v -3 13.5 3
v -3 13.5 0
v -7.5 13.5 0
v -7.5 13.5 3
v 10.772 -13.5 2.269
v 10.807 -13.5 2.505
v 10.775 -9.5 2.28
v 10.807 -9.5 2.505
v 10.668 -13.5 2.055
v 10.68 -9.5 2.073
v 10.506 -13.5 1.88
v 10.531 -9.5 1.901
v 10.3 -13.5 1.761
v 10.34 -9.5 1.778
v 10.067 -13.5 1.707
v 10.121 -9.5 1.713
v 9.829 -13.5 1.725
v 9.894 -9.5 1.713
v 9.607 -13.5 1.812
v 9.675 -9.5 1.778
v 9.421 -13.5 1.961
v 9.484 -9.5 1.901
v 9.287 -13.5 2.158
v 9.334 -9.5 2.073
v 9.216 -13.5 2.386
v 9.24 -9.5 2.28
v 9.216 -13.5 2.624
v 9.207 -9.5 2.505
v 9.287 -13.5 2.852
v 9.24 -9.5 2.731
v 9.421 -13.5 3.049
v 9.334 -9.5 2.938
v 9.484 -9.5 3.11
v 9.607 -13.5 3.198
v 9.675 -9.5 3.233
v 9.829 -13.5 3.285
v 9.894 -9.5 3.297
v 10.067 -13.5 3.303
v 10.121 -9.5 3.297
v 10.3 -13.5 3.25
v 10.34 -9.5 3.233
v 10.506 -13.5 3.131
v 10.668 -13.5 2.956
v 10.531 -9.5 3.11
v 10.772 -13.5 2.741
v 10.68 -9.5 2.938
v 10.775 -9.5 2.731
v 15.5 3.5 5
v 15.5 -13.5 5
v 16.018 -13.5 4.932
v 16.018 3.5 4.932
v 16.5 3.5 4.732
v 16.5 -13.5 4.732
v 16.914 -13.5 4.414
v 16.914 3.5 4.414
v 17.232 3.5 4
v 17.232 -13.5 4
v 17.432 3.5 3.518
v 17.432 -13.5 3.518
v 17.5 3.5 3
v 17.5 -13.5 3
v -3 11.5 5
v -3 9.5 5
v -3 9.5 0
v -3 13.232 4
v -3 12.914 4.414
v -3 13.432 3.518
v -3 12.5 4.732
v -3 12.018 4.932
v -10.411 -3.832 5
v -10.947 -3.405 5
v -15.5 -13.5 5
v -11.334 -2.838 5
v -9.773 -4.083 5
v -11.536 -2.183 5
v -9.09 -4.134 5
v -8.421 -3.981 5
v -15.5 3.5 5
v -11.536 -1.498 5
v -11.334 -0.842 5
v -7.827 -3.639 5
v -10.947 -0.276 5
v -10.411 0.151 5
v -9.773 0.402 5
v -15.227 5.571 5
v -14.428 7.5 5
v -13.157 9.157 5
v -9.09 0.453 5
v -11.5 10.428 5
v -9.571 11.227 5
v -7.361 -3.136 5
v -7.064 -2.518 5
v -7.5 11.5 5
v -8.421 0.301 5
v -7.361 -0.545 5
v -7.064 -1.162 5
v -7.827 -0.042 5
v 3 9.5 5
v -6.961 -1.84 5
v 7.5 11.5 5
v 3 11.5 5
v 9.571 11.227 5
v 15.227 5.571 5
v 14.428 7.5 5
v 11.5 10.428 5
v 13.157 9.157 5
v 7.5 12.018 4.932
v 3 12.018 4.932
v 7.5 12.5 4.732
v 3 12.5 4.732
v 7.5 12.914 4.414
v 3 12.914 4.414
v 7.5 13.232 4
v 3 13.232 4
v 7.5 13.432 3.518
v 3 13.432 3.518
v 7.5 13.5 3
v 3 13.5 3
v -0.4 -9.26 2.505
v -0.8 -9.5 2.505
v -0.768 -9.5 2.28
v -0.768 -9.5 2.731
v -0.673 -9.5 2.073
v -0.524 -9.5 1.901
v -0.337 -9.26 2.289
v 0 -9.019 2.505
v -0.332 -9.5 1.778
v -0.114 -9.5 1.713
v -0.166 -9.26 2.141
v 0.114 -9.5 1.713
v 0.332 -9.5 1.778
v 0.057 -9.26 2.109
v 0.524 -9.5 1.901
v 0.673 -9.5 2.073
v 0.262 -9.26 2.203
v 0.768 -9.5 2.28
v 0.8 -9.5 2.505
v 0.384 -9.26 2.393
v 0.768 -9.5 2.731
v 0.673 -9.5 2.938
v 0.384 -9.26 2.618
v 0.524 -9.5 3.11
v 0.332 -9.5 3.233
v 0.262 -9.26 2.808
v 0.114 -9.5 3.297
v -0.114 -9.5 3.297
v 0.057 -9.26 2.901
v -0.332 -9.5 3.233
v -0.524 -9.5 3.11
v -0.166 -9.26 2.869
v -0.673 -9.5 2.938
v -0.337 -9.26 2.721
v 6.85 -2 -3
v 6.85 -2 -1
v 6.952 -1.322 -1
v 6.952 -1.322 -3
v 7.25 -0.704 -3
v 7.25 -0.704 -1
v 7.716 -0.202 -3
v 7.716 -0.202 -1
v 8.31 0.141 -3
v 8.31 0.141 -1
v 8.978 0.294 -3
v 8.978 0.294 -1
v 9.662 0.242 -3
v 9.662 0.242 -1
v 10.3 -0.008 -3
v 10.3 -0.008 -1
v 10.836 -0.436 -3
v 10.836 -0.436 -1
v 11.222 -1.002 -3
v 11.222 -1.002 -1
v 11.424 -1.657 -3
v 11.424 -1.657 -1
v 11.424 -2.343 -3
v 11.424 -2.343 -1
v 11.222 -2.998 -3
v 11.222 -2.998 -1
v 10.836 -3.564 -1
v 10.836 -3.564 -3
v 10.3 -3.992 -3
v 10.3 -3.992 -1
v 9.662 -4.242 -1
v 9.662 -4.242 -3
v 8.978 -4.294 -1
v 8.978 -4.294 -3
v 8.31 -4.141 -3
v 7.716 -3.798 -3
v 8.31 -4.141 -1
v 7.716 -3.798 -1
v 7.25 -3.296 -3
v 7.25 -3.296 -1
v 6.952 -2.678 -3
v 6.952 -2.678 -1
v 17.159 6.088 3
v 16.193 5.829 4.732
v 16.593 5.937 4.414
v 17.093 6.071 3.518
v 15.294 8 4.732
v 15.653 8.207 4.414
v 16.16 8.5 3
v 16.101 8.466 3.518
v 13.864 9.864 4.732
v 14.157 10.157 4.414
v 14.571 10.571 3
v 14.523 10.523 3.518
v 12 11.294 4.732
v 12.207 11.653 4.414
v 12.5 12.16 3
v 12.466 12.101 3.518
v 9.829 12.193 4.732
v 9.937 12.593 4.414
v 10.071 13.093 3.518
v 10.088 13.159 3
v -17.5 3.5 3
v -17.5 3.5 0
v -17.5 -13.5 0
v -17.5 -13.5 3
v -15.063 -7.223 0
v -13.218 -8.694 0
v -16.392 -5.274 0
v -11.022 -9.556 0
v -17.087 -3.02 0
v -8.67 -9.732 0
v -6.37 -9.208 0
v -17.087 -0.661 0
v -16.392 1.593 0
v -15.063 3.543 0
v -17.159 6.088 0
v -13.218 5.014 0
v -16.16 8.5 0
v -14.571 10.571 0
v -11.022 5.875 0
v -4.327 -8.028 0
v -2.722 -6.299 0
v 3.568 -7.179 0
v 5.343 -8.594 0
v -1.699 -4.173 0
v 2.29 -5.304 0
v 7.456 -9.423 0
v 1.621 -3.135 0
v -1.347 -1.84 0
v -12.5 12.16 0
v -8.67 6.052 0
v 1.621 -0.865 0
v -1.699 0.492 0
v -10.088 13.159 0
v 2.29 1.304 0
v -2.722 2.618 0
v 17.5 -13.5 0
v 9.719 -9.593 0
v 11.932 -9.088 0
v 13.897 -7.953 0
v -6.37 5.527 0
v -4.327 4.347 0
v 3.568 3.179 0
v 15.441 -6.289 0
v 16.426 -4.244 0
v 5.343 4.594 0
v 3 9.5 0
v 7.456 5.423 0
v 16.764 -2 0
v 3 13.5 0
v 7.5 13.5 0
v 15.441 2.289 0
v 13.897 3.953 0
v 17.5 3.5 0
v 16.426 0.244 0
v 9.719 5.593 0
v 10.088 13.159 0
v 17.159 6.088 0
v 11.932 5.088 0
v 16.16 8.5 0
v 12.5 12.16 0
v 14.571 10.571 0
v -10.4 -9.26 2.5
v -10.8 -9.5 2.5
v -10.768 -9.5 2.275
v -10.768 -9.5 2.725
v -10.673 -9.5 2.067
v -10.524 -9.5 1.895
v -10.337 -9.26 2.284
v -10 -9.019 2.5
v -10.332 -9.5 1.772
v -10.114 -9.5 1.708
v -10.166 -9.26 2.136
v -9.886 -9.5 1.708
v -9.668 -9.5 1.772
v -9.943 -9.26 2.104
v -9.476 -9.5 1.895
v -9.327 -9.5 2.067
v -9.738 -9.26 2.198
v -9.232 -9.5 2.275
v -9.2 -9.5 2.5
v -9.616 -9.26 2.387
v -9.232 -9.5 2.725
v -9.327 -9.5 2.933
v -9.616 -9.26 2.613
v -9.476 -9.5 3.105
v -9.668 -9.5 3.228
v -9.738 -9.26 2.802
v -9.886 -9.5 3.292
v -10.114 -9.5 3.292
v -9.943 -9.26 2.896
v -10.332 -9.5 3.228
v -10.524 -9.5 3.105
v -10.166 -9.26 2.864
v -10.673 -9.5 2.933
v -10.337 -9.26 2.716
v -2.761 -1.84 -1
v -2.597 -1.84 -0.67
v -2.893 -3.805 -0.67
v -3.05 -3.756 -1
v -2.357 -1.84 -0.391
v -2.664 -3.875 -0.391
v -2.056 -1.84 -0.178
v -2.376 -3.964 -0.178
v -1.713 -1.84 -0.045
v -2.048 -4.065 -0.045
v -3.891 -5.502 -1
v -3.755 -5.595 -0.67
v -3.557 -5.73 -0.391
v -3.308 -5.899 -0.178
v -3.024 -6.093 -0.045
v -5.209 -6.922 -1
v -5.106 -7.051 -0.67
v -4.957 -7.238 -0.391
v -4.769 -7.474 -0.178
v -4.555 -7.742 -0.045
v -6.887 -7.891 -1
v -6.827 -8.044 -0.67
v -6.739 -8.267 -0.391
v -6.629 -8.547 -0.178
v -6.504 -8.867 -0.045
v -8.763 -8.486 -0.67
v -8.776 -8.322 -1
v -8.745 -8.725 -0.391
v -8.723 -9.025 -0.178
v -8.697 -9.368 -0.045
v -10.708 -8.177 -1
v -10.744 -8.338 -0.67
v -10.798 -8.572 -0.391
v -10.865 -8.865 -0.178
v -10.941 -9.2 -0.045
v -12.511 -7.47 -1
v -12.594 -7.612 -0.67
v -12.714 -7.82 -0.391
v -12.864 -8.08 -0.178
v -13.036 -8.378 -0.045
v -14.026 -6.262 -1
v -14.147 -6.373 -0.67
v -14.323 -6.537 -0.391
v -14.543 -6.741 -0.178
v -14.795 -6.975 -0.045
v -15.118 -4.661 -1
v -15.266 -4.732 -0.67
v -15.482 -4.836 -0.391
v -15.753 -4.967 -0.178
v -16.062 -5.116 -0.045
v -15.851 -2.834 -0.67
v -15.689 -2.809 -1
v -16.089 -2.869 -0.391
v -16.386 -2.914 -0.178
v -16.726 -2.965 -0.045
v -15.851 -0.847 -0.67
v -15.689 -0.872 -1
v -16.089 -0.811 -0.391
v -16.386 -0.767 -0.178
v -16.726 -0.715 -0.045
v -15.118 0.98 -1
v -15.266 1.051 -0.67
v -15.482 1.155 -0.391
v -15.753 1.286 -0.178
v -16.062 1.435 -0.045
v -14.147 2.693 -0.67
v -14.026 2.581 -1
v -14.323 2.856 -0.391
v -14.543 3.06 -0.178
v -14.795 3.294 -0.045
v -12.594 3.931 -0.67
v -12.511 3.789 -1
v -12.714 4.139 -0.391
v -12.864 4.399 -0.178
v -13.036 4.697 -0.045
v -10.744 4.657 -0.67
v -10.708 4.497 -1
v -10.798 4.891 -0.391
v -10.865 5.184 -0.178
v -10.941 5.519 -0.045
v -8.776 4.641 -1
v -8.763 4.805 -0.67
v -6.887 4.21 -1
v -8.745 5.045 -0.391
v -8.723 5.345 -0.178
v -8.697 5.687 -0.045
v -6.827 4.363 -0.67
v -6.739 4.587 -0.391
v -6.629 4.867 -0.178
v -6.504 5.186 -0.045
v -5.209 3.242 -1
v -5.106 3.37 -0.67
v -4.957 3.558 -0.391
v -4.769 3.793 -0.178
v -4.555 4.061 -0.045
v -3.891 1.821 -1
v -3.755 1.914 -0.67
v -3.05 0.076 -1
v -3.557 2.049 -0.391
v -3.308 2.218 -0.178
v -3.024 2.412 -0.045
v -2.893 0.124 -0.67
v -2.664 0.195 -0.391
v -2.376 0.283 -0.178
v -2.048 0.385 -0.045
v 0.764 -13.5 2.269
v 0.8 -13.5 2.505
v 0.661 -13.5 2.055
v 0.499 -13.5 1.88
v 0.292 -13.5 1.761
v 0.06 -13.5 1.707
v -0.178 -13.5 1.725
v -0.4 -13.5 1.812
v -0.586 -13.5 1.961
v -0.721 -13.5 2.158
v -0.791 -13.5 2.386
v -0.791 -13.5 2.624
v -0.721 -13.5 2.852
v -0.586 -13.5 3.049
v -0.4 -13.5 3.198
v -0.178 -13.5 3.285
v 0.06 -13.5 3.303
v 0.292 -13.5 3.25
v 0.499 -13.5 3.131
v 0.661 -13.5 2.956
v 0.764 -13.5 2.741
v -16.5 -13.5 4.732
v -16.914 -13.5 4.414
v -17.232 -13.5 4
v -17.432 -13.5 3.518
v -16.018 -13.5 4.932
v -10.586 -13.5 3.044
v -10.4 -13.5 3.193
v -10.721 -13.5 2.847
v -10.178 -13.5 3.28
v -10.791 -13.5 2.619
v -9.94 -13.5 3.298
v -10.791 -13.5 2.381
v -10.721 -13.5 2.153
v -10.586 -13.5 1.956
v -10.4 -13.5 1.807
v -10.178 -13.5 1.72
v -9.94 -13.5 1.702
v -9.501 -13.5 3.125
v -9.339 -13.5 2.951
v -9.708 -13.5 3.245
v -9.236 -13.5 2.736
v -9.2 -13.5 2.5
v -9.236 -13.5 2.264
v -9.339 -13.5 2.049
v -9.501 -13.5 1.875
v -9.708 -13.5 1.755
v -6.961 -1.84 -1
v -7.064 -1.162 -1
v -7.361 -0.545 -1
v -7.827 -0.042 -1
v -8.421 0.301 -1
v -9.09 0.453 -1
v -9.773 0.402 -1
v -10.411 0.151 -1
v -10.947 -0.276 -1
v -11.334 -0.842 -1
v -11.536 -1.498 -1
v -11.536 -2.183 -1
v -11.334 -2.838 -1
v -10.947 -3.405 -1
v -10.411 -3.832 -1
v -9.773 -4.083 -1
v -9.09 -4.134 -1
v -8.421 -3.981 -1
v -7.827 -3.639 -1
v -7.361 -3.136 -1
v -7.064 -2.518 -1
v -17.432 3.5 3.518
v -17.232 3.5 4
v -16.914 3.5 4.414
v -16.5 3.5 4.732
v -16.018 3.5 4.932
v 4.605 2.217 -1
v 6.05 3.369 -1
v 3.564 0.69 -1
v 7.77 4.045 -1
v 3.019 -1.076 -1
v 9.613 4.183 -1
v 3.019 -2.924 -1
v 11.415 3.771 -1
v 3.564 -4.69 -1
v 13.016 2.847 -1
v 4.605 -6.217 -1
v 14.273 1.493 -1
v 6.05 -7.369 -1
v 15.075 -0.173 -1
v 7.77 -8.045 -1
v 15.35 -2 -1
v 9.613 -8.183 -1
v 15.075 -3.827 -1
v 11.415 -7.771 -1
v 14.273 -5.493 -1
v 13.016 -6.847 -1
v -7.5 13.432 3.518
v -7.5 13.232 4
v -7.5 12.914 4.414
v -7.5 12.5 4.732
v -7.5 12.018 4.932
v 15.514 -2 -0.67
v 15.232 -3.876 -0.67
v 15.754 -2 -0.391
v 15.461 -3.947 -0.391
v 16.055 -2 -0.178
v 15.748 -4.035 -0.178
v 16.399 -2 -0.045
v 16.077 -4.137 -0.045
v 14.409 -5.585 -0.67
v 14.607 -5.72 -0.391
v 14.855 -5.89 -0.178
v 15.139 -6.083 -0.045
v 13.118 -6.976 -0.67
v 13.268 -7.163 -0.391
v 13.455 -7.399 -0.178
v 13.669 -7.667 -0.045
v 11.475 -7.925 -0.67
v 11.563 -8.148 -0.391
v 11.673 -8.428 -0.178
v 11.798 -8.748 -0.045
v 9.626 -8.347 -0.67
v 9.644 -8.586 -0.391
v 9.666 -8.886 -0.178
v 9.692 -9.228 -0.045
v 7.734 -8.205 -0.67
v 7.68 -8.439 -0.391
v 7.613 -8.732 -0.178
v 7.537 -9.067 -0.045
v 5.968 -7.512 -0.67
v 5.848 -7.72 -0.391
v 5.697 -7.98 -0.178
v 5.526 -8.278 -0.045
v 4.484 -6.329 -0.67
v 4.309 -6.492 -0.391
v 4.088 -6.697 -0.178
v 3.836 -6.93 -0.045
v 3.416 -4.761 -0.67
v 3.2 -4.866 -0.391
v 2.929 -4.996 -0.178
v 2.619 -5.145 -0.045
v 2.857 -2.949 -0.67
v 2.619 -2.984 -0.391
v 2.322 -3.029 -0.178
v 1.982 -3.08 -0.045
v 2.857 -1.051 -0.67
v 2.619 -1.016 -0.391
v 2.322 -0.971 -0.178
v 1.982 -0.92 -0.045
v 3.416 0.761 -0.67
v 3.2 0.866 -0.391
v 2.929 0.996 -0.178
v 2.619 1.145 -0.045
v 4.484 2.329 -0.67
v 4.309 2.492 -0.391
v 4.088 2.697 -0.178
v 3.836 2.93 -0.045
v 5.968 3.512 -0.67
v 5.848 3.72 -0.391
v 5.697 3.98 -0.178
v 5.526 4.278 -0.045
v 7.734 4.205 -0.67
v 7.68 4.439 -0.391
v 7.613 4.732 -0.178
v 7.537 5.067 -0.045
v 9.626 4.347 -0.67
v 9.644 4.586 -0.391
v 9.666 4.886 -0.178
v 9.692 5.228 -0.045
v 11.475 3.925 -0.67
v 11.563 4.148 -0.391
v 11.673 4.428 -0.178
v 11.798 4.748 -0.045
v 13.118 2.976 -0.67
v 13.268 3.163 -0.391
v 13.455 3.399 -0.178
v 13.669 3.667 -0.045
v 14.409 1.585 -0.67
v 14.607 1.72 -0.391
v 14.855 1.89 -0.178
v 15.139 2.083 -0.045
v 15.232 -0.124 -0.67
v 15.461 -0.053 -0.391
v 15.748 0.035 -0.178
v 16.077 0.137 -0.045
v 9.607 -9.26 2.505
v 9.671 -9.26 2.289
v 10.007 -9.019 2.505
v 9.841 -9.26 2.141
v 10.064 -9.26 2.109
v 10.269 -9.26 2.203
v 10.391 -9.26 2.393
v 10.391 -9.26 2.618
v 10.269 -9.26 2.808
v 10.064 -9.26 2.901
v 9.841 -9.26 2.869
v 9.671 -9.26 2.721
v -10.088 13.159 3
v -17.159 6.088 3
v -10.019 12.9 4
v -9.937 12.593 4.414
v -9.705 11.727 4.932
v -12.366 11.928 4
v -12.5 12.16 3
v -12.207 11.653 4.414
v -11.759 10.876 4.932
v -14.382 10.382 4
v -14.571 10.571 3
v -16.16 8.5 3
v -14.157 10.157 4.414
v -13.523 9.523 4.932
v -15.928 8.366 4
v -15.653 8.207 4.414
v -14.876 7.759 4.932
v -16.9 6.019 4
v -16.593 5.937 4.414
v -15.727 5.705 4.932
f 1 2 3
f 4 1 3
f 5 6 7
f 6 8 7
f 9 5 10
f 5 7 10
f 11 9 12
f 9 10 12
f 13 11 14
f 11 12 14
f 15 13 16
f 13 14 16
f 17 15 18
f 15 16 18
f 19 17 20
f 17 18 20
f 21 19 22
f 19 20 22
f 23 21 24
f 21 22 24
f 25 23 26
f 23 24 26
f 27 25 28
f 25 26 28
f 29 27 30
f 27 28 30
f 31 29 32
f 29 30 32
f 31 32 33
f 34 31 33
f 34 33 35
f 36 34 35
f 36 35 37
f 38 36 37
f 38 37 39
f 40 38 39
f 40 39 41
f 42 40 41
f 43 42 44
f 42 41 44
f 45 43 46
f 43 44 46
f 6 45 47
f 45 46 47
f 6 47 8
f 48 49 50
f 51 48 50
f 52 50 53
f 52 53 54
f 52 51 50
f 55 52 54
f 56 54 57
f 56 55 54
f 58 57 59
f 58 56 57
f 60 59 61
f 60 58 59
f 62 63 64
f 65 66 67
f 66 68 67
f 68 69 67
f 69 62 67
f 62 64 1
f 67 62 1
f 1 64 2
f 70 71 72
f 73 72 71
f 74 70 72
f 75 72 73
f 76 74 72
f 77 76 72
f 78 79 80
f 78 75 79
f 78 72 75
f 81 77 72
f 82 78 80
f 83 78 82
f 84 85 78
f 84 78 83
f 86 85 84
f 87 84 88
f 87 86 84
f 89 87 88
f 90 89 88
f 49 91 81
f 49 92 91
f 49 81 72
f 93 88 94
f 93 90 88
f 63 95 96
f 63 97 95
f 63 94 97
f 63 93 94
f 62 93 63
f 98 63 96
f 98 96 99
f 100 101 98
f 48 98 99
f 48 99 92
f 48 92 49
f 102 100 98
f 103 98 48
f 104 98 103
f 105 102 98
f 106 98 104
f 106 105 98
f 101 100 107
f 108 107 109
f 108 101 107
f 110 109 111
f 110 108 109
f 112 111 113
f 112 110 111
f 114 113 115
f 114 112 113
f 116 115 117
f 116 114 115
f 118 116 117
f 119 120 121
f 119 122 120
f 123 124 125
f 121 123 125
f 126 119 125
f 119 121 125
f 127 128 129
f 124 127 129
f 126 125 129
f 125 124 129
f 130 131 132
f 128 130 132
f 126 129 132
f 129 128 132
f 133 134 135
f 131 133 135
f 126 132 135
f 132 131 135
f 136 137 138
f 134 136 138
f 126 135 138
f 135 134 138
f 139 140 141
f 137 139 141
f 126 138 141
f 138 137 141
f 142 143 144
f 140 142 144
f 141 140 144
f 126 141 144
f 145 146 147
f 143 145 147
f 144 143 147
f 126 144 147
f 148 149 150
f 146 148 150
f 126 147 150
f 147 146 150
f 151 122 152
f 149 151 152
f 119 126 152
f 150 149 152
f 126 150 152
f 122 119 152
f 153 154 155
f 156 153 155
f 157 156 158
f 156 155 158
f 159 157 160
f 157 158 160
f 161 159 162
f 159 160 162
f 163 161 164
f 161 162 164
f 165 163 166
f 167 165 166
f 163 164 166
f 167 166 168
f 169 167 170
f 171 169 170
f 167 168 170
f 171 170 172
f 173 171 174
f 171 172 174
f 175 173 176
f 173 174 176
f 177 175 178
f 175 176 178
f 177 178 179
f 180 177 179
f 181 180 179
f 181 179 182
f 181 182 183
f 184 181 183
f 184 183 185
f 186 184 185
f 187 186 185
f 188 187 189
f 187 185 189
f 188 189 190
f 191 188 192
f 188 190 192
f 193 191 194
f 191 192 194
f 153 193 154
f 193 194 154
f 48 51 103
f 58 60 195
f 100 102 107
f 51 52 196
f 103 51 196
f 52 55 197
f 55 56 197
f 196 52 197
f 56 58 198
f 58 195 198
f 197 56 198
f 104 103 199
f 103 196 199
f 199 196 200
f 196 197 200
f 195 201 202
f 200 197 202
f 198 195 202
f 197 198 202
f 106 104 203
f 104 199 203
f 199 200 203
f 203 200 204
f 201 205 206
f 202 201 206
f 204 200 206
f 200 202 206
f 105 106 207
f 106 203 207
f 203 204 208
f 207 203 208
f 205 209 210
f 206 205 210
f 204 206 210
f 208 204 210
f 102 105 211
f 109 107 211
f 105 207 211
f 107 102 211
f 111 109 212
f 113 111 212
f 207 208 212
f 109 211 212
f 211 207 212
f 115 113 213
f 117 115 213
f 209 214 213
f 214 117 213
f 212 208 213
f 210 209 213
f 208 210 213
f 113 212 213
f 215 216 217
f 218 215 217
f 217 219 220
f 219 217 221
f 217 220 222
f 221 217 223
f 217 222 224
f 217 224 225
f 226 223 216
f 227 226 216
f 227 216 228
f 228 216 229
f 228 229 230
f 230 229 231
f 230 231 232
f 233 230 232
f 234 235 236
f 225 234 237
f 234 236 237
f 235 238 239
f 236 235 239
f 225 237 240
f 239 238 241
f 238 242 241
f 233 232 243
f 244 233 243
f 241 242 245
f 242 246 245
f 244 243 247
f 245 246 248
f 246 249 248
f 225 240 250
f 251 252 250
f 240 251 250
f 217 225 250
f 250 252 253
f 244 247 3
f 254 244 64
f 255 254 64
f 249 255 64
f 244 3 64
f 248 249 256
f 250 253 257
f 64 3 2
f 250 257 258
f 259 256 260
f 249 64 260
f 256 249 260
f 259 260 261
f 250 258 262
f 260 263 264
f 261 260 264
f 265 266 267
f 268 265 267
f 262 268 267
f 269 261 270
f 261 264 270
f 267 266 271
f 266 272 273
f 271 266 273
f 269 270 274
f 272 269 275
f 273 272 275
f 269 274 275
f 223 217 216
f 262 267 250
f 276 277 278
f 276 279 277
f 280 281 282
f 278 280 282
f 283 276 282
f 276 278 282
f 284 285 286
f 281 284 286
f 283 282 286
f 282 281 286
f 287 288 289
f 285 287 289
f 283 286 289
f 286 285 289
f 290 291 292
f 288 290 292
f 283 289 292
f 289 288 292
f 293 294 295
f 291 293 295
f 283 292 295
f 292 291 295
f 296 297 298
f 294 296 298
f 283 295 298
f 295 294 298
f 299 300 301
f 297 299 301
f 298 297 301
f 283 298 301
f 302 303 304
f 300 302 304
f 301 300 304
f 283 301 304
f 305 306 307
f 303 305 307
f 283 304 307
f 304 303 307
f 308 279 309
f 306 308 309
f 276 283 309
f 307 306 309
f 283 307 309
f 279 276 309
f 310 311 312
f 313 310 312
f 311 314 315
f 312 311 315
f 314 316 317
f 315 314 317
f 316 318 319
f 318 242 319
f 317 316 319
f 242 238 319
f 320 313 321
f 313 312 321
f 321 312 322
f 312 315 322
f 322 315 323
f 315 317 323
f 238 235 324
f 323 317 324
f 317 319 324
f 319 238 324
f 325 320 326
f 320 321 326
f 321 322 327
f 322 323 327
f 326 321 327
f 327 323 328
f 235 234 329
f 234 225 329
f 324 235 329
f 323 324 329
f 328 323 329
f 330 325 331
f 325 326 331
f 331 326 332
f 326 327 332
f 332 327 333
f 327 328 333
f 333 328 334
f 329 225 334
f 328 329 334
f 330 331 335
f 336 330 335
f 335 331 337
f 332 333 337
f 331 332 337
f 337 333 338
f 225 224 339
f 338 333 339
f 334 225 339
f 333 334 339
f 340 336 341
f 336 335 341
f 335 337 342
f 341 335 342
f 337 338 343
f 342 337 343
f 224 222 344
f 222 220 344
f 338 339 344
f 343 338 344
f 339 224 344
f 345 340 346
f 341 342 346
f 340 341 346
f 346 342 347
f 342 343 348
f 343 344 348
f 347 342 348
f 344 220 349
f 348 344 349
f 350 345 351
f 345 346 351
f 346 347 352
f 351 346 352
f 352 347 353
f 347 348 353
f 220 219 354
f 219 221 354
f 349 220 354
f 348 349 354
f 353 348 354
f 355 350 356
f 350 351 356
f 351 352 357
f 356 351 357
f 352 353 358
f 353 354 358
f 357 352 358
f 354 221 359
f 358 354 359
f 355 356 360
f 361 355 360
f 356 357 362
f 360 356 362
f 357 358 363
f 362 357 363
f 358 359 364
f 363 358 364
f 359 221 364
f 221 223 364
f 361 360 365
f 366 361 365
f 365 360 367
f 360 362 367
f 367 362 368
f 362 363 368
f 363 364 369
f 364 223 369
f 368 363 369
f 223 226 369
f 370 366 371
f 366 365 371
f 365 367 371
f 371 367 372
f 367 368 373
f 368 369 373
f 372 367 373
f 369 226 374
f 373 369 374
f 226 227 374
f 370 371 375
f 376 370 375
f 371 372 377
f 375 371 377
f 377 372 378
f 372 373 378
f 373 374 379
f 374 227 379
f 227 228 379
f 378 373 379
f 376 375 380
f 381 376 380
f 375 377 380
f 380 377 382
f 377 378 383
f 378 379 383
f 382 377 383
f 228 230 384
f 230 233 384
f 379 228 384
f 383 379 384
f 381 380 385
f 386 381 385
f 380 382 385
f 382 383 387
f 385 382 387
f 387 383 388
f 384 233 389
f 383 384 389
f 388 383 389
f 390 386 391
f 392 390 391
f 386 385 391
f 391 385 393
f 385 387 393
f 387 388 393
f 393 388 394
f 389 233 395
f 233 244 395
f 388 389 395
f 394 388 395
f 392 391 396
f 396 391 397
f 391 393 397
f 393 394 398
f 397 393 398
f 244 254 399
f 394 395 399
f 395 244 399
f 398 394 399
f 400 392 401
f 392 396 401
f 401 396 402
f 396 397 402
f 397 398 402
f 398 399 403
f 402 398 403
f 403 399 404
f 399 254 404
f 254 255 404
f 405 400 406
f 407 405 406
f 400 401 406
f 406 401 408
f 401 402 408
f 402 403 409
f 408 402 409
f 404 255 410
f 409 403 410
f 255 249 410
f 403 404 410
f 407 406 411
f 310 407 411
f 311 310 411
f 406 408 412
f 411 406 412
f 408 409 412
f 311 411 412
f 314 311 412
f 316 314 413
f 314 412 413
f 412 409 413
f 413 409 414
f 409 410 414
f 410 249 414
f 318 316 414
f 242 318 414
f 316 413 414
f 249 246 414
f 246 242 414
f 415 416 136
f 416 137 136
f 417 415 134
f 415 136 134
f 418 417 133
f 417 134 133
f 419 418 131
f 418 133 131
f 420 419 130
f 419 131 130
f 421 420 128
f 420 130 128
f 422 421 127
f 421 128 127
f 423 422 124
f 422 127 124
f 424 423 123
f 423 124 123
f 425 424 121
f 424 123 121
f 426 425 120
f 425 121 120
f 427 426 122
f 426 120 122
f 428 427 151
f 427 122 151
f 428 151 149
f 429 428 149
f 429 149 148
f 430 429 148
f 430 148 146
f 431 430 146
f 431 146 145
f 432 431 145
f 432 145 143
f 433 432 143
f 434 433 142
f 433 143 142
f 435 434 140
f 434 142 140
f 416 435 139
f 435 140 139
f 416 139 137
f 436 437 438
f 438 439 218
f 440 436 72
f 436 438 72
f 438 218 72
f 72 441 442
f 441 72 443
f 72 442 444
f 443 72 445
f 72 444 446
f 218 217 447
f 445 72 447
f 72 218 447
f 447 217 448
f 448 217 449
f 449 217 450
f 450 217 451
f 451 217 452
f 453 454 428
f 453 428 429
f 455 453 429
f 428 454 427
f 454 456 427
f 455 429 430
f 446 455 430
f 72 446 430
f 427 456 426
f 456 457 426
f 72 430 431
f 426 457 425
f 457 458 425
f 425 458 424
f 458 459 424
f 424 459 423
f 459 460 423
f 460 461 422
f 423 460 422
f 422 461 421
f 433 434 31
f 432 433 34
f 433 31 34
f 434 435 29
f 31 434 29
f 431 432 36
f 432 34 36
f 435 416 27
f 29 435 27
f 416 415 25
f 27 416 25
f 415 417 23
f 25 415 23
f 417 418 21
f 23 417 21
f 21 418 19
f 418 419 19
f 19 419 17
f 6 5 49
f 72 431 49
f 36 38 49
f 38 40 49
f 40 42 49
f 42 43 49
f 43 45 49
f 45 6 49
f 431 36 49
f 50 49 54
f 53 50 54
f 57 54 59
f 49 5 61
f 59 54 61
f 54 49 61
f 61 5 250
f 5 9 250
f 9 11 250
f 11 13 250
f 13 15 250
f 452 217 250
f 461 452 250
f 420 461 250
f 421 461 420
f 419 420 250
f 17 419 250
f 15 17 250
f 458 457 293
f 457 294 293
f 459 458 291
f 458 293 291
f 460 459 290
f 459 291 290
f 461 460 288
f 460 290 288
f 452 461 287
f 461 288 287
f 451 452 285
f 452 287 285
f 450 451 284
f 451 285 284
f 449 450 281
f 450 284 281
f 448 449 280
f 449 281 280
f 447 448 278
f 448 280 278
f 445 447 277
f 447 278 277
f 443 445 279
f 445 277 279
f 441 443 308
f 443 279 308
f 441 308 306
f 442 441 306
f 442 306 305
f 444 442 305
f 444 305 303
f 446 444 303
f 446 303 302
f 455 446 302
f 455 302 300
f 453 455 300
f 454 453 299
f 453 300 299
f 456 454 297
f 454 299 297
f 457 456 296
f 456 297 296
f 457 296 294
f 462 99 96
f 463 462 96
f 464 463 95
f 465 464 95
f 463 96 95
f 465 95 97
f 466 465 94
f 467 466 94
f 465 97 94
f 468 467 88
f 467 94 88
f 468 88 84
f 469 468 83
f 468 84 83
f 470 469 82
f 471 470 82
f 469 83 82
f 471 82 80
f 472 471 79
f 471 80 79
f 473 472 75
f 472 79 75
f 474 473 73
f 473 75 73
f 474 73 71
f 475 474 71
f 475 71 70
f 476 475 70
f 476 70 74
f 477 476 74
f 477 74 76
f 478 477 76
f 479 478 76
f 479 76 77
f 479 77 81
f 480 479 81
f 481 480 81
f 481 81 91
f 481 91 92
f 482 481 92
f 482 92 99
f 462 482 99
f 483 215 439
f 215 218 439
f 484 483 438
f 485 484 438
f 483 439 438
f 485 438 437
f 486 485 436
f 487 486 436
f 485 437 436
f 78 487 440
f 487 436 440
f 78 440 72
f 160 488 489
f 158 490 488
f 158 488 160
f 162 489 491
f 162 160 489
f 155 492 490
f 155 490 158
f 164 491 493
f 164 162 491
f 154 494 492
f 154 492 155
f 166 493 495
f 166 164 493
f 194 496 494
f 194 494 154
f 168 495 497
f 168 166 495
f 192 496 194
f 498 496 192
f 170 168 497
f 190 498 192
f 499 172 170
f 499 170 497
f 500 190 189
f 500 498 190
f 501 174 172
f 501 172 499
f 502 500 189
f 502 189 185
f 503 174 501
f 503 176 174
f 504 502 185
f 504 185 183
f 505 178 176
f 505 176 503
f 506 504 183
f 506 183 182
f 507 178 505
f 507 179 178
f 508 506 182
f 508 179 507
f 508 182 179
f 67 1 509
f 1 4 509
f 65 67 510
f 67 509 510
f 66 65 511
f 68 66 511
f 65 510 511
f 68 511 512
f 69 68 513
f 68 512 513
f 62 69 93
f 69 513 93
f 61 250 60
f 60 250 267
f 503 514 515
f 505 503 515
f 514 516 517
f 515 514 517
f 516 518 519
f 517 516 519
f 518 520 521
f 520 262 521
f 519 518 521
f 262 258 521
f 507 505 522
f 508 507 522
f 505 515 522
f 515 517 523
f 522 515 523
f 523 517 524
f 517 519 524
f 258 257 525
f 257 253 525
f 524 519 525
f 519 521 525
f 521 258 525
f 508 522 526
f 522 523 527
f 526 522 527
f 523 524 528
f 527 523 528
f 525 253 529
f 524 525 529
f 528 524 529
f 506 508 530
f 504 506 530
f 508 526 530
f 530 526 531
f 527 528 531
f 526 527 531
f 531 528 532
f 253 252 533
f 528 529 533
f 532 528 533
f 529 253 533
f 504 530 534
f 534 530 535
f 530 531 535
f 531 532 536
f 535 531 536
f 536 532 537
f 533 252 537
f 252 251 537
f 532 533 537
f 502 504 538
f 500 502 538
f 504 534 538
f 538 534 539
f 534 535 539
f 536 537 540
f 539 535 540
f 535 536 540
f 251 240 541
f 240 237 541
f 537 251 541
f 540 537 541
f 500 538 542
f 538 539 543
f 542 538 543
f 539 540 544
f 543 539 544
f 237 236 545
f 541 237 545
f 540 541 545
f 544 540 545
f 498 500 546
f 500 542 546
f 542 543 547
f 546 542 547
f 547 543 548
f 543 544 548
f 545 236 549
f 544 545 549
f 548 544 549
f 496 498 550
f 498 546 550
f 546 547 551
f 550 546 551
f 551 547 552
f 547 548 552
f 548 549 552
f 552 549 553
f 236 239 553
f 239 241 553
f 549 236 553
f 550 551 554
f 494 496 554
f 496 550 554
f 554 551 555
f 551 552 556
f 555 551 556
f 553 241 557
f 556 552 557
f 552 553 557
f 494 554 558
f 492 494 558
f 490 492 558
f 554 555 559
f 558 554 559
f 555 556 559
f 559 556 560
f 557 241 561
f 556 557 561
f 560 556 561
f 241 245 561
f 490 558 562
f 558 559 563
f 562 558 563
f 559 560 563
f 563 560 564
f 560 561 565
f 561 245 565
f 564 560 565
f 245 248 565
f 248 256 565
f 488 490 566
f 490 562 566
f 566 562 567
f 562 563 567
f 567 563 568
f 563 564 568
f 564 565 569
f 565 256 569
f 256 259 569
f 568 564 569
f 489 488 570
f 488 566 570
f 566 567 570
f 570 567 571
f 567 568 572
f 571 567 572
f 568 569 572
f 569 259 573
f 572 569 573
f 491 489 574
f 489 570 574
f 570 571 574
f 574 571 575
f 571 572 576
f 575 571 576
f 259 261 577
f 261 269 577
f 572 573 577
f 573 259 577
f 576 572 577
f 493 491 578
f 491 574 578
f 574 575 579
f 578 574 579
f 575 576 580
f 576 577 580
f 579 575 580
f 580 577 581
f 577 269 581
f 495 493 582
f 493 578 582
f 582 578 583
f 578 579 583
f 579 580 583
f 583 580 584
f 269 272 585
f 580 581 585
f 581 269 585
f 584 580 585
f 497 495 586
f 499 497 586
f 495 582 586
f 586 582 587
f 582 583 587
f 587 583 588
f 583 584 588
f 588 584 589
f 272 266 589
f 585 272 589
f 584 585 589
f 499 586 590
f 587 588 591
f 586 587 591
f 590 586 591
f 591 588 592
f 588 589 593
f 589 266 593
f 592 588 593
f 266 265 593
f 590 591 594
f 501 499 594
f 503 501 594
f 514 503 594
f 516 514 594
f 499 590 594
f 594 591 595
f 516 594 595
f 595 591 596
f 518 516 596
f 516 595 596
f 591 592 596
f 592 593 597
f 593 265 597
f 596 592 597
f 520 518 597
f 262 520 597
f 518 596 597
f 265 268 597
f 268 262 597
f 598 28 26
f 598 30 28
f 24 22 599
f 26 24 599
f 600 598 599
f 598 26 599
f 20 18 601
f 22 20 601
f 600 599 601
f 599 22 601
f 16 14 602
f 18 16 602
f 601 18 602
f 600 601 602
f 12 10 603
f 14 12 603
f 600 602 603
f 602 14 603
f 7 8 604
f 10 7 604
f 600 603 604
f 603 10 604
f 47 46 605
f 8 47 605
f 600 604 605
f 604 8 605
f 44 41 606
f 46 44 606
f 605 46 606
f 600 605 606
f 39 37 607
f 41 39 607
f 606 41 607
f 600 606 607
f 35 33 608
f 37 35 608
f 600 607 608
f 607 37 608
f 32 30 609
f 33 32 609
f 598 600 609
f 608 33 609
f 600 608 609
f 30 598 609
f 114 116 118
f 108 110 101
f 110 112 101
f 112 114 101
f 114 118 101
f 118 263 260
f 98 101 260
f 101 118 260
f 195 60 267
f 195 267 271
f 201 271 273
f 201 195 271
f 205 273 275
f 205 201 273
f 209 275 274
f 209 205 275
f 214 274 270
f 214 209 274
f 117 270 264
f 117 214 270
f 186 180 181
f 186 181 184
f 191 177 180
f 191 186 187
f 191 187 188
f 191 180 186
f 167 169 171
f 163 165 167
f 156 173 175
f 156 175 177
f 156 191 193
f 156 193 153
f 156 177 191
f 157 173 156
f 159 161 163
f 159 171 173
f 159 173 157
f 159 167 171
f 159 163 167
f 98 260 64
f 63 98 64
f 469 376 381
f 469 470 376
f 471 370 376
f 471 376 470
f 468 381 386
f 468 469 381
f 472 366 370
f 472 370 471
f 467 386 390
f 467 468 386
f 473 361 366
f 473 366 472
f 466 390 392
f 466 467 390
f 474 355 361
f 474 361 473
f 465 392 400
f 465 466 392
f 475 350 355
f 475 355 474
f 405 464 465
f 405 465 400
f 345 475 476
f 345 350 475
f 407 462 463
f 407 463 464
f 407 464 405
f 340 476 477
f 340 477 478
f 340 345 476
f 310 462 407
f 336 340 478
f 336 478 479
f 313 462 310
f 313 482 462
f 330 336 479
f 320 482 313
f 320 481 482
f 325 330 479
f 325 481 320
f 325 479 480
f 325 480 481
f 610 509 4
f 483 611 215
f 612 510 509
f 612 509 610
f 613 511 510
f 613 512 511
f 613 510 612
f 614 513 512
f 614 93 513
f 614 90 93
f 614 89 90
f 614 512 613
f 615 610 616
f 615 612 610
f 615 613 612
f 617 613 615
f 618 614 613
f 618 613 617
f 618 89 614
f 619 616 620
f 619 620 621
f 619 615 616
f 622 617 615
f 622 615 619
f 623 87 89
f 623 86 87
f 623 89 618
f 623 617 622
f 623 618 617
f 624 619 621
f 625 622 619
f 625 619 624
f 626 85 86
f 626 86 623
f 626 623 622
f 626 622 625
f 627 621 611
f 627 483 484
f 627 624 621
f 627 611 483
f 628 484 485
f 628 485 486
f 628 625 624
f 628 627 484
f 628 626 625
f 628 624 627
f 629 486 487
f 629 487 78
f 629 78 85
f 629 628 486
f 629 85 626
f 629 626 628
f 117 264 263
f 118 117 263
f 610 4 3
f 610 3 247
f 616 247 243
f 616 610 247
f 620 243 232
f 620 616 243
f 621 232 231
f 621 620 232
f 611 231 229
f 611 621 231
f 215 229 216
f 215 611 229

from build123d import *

# Parameters (mm, degrees)
BOSS_EXTRUDE1_DEPTH              = 5
FILLET1_R                        = 10
FILLET2_R                        = 2
SKETCH2_R                        = 6.5
SKETCH2_R_2                      = 2.3
SKETCH2_R_3                      = 6.2
BOSS_EXTRUDE2_DEPTH              = 1
FILLET3_R                        = 1.5
TAP_DRILL_SLOT_FOR_M2_TAP1_D     = 1.6
TAP_DRILL_SLOT_FOR_M2_TAP1_DEPTH = 4
TAP_DRILL_SLOT_FOR_M2_TAP1_TIP   = 0.480688495
SKETCH3_R                        = 2.3
BOSS_EXTRUDE3_DEPTH              = 2
SKETCH8_R                        = 2.3
CUT_EXTRUDE1_DEPTH               = 10


with BuildPart() as part:
    # Sketch1 → Boss-Extrude1 (new body)
    with BuildSketch(Plane.XY):
        Polygon((3, 13.5), (3, 9.5), (-3, 9.5), (-3, 13.5), (-17.5, 13.5), (-17.5, -13.5), (17.5, -13.5), (17.5, 13.5), align=None)
    extrude(amount=BOSS_EXTRUDE1_DEPTH)

    # Fillet1
    fillet1_edges = [part.edges().sort_by_distance(p)[0] for p in [
        (17.5, 13.5, 2.5),
        (-17.5, 13.5, 2.5),
    ]]
    fillet(fillet1_edges, radius=FILLET1_R)

    # Fillet2
    fillet2_edges = [part.edges().sort_by_distance(p)[0] for p in [
        (-5.25, 13.5, 5),
        (-17.5, -5, 5),
        (17.5, -5, 5),
        (5.25, 13.5, 5),
        (14.571067812, 10.571067812, 5),
        (-14.571067812, 10.571067812, 5),
    ]]
    fillet(fillet2_edges, radius=FILLET2_R)

    # Sketch2 → Boss-Extrude2 (add)
    # profile 1 of 2: a face of its own
    with BuildSketch(Plane(origin=(0, 0, 0), x_dir=(-1, 0, 0), z_dir=(0, 0, -1))):
        with Locations(Location((9.261392854, -1.840391381, 0), (0, 0, 180))):
            Circle(SKETCH2_R)
        with Locations((9.261392854, -1.840391381)):
            Circle(SKETCH2_R_2, mode=Mode.SUBTRACT)
    # profile 2 of 2: a face of its own
    with BuildSketch(Plane(origin=(0, 0, 0), x_dir=(-1, 0, 0), z_dir=(0, 0, -1))):
        with Locations(Location((-9.15, -2, 0), (0, 0, 180))):
            Circle(SKETCH2_R_3)
    extrude(amount=BOSS_EXTRUDE2_DEPTH)

    # Fillet3
    # the kernel refuses this fillet: 1.5 mm, written as the material it adds along each edge
    with BuildSketch(Plane(origin=(-9.261392854, -1.840391381, 0), x_dir=(1, 0, 0), z_dir=(0, 1, 0))) as fillet3_piece_1:
        with BuildLine():
            CenterArc((7.914213562, 1.5), FILLET3_R, 199.471220634, 70.528779366)
            Line((6.5, 1), (6.471715729, 0.99))
            ThreePointArc((6.471715729, 0.99), (6.47, 0.5), (6.47, 0))
            Line((6.47, 0), (6.5, -0.03))
            Line((6.5, -0.03), (7.914213562, -0.03))
            Line((7.914213562, -0.03), (7.914213562, 0))
        make_face()
    revolve(axis=Axis((-9.261392854, -1.840391381, 0), (0, 0, -1)))
    with BuildSketch(Plane(origin=(9.15, -2, 0), x_dir=(1, 0, 0), z_dir=(0, 1, 0))) as fillet3_piece_2:
        with BuildLine():
            CenterArc((7.614213562, 1.5), FILLET3_R, 199.471220634, 70.528779366)
            Line((6.2, 1), (6.171715729, 0.99))
            ThreePointArc((6.171715729, 0.99), (6.17, 0.5), (6.17, 0))
            Line((6.17, 0), (6.2, -0.03))
            Line((6.2, -0.03), (7.614213562, -0.03))
            Line((7.614213562, -0.03), (7.614213562, 0))
        make_face()
    revolve(axis=Axis((9.15, -2, 0), (0, 0, -1)))

    # Tap Drill Slot for M2 Tap1
    with Locations(Plane(origin=(0, -13.5, 0), x_dir=(-1, 0, 0), z_dir=(0, -1, 0))):
        with Locations((-10.007456689, -2.505236507), (0, -2.505236507), (10, -2.5)):
            Hole(TAP_DRILL_SLOT_FOR_M2_TAP1_D / 2, depth=TAP_DRILL_SLOT_FOR_M2_TAP1_DEPTH)
            with Locations((0, 0, -(TAP_DRILL_SLOT_FOR_M2_TAP1_DEPTH + TAP_DRILL_SLOT_FOR_M2_TAP1_TIP / 2))):  # 118° drill point
                Cone(0, TAP_DRILL_SLOT_FOR_M2_TAP1_D / 2, TAP_DRILL_SLOT_FOR_M2_TAP1_TIP, mode=Mode.SUBTRACT)

    # Sketch3 → Boss-Extrude3 (add)
    with BuildSketch(Plane(origin=(0, 0, -1), x_dir=(-1, 0, 0), z_dir=(0, 0, -1))):
        with Locations((-9.15, -2)):
            Circle(SKETCH3_R)
    extrude(amount=BOSS_EXTRUDE3_DEPTH)

    # Sketch8 → Cut-Extrude1 (cut)
    with BuildSketch(Plane.XY.offset(5)):
        with Locations((-9.261392854, -1.840391381)):
            Circle(SKETCH8_R)
    extrude(amount=-CUT_EXTRUDE1_DEPTH, mode=Mode.SUBTRACT)


solid = part.part
